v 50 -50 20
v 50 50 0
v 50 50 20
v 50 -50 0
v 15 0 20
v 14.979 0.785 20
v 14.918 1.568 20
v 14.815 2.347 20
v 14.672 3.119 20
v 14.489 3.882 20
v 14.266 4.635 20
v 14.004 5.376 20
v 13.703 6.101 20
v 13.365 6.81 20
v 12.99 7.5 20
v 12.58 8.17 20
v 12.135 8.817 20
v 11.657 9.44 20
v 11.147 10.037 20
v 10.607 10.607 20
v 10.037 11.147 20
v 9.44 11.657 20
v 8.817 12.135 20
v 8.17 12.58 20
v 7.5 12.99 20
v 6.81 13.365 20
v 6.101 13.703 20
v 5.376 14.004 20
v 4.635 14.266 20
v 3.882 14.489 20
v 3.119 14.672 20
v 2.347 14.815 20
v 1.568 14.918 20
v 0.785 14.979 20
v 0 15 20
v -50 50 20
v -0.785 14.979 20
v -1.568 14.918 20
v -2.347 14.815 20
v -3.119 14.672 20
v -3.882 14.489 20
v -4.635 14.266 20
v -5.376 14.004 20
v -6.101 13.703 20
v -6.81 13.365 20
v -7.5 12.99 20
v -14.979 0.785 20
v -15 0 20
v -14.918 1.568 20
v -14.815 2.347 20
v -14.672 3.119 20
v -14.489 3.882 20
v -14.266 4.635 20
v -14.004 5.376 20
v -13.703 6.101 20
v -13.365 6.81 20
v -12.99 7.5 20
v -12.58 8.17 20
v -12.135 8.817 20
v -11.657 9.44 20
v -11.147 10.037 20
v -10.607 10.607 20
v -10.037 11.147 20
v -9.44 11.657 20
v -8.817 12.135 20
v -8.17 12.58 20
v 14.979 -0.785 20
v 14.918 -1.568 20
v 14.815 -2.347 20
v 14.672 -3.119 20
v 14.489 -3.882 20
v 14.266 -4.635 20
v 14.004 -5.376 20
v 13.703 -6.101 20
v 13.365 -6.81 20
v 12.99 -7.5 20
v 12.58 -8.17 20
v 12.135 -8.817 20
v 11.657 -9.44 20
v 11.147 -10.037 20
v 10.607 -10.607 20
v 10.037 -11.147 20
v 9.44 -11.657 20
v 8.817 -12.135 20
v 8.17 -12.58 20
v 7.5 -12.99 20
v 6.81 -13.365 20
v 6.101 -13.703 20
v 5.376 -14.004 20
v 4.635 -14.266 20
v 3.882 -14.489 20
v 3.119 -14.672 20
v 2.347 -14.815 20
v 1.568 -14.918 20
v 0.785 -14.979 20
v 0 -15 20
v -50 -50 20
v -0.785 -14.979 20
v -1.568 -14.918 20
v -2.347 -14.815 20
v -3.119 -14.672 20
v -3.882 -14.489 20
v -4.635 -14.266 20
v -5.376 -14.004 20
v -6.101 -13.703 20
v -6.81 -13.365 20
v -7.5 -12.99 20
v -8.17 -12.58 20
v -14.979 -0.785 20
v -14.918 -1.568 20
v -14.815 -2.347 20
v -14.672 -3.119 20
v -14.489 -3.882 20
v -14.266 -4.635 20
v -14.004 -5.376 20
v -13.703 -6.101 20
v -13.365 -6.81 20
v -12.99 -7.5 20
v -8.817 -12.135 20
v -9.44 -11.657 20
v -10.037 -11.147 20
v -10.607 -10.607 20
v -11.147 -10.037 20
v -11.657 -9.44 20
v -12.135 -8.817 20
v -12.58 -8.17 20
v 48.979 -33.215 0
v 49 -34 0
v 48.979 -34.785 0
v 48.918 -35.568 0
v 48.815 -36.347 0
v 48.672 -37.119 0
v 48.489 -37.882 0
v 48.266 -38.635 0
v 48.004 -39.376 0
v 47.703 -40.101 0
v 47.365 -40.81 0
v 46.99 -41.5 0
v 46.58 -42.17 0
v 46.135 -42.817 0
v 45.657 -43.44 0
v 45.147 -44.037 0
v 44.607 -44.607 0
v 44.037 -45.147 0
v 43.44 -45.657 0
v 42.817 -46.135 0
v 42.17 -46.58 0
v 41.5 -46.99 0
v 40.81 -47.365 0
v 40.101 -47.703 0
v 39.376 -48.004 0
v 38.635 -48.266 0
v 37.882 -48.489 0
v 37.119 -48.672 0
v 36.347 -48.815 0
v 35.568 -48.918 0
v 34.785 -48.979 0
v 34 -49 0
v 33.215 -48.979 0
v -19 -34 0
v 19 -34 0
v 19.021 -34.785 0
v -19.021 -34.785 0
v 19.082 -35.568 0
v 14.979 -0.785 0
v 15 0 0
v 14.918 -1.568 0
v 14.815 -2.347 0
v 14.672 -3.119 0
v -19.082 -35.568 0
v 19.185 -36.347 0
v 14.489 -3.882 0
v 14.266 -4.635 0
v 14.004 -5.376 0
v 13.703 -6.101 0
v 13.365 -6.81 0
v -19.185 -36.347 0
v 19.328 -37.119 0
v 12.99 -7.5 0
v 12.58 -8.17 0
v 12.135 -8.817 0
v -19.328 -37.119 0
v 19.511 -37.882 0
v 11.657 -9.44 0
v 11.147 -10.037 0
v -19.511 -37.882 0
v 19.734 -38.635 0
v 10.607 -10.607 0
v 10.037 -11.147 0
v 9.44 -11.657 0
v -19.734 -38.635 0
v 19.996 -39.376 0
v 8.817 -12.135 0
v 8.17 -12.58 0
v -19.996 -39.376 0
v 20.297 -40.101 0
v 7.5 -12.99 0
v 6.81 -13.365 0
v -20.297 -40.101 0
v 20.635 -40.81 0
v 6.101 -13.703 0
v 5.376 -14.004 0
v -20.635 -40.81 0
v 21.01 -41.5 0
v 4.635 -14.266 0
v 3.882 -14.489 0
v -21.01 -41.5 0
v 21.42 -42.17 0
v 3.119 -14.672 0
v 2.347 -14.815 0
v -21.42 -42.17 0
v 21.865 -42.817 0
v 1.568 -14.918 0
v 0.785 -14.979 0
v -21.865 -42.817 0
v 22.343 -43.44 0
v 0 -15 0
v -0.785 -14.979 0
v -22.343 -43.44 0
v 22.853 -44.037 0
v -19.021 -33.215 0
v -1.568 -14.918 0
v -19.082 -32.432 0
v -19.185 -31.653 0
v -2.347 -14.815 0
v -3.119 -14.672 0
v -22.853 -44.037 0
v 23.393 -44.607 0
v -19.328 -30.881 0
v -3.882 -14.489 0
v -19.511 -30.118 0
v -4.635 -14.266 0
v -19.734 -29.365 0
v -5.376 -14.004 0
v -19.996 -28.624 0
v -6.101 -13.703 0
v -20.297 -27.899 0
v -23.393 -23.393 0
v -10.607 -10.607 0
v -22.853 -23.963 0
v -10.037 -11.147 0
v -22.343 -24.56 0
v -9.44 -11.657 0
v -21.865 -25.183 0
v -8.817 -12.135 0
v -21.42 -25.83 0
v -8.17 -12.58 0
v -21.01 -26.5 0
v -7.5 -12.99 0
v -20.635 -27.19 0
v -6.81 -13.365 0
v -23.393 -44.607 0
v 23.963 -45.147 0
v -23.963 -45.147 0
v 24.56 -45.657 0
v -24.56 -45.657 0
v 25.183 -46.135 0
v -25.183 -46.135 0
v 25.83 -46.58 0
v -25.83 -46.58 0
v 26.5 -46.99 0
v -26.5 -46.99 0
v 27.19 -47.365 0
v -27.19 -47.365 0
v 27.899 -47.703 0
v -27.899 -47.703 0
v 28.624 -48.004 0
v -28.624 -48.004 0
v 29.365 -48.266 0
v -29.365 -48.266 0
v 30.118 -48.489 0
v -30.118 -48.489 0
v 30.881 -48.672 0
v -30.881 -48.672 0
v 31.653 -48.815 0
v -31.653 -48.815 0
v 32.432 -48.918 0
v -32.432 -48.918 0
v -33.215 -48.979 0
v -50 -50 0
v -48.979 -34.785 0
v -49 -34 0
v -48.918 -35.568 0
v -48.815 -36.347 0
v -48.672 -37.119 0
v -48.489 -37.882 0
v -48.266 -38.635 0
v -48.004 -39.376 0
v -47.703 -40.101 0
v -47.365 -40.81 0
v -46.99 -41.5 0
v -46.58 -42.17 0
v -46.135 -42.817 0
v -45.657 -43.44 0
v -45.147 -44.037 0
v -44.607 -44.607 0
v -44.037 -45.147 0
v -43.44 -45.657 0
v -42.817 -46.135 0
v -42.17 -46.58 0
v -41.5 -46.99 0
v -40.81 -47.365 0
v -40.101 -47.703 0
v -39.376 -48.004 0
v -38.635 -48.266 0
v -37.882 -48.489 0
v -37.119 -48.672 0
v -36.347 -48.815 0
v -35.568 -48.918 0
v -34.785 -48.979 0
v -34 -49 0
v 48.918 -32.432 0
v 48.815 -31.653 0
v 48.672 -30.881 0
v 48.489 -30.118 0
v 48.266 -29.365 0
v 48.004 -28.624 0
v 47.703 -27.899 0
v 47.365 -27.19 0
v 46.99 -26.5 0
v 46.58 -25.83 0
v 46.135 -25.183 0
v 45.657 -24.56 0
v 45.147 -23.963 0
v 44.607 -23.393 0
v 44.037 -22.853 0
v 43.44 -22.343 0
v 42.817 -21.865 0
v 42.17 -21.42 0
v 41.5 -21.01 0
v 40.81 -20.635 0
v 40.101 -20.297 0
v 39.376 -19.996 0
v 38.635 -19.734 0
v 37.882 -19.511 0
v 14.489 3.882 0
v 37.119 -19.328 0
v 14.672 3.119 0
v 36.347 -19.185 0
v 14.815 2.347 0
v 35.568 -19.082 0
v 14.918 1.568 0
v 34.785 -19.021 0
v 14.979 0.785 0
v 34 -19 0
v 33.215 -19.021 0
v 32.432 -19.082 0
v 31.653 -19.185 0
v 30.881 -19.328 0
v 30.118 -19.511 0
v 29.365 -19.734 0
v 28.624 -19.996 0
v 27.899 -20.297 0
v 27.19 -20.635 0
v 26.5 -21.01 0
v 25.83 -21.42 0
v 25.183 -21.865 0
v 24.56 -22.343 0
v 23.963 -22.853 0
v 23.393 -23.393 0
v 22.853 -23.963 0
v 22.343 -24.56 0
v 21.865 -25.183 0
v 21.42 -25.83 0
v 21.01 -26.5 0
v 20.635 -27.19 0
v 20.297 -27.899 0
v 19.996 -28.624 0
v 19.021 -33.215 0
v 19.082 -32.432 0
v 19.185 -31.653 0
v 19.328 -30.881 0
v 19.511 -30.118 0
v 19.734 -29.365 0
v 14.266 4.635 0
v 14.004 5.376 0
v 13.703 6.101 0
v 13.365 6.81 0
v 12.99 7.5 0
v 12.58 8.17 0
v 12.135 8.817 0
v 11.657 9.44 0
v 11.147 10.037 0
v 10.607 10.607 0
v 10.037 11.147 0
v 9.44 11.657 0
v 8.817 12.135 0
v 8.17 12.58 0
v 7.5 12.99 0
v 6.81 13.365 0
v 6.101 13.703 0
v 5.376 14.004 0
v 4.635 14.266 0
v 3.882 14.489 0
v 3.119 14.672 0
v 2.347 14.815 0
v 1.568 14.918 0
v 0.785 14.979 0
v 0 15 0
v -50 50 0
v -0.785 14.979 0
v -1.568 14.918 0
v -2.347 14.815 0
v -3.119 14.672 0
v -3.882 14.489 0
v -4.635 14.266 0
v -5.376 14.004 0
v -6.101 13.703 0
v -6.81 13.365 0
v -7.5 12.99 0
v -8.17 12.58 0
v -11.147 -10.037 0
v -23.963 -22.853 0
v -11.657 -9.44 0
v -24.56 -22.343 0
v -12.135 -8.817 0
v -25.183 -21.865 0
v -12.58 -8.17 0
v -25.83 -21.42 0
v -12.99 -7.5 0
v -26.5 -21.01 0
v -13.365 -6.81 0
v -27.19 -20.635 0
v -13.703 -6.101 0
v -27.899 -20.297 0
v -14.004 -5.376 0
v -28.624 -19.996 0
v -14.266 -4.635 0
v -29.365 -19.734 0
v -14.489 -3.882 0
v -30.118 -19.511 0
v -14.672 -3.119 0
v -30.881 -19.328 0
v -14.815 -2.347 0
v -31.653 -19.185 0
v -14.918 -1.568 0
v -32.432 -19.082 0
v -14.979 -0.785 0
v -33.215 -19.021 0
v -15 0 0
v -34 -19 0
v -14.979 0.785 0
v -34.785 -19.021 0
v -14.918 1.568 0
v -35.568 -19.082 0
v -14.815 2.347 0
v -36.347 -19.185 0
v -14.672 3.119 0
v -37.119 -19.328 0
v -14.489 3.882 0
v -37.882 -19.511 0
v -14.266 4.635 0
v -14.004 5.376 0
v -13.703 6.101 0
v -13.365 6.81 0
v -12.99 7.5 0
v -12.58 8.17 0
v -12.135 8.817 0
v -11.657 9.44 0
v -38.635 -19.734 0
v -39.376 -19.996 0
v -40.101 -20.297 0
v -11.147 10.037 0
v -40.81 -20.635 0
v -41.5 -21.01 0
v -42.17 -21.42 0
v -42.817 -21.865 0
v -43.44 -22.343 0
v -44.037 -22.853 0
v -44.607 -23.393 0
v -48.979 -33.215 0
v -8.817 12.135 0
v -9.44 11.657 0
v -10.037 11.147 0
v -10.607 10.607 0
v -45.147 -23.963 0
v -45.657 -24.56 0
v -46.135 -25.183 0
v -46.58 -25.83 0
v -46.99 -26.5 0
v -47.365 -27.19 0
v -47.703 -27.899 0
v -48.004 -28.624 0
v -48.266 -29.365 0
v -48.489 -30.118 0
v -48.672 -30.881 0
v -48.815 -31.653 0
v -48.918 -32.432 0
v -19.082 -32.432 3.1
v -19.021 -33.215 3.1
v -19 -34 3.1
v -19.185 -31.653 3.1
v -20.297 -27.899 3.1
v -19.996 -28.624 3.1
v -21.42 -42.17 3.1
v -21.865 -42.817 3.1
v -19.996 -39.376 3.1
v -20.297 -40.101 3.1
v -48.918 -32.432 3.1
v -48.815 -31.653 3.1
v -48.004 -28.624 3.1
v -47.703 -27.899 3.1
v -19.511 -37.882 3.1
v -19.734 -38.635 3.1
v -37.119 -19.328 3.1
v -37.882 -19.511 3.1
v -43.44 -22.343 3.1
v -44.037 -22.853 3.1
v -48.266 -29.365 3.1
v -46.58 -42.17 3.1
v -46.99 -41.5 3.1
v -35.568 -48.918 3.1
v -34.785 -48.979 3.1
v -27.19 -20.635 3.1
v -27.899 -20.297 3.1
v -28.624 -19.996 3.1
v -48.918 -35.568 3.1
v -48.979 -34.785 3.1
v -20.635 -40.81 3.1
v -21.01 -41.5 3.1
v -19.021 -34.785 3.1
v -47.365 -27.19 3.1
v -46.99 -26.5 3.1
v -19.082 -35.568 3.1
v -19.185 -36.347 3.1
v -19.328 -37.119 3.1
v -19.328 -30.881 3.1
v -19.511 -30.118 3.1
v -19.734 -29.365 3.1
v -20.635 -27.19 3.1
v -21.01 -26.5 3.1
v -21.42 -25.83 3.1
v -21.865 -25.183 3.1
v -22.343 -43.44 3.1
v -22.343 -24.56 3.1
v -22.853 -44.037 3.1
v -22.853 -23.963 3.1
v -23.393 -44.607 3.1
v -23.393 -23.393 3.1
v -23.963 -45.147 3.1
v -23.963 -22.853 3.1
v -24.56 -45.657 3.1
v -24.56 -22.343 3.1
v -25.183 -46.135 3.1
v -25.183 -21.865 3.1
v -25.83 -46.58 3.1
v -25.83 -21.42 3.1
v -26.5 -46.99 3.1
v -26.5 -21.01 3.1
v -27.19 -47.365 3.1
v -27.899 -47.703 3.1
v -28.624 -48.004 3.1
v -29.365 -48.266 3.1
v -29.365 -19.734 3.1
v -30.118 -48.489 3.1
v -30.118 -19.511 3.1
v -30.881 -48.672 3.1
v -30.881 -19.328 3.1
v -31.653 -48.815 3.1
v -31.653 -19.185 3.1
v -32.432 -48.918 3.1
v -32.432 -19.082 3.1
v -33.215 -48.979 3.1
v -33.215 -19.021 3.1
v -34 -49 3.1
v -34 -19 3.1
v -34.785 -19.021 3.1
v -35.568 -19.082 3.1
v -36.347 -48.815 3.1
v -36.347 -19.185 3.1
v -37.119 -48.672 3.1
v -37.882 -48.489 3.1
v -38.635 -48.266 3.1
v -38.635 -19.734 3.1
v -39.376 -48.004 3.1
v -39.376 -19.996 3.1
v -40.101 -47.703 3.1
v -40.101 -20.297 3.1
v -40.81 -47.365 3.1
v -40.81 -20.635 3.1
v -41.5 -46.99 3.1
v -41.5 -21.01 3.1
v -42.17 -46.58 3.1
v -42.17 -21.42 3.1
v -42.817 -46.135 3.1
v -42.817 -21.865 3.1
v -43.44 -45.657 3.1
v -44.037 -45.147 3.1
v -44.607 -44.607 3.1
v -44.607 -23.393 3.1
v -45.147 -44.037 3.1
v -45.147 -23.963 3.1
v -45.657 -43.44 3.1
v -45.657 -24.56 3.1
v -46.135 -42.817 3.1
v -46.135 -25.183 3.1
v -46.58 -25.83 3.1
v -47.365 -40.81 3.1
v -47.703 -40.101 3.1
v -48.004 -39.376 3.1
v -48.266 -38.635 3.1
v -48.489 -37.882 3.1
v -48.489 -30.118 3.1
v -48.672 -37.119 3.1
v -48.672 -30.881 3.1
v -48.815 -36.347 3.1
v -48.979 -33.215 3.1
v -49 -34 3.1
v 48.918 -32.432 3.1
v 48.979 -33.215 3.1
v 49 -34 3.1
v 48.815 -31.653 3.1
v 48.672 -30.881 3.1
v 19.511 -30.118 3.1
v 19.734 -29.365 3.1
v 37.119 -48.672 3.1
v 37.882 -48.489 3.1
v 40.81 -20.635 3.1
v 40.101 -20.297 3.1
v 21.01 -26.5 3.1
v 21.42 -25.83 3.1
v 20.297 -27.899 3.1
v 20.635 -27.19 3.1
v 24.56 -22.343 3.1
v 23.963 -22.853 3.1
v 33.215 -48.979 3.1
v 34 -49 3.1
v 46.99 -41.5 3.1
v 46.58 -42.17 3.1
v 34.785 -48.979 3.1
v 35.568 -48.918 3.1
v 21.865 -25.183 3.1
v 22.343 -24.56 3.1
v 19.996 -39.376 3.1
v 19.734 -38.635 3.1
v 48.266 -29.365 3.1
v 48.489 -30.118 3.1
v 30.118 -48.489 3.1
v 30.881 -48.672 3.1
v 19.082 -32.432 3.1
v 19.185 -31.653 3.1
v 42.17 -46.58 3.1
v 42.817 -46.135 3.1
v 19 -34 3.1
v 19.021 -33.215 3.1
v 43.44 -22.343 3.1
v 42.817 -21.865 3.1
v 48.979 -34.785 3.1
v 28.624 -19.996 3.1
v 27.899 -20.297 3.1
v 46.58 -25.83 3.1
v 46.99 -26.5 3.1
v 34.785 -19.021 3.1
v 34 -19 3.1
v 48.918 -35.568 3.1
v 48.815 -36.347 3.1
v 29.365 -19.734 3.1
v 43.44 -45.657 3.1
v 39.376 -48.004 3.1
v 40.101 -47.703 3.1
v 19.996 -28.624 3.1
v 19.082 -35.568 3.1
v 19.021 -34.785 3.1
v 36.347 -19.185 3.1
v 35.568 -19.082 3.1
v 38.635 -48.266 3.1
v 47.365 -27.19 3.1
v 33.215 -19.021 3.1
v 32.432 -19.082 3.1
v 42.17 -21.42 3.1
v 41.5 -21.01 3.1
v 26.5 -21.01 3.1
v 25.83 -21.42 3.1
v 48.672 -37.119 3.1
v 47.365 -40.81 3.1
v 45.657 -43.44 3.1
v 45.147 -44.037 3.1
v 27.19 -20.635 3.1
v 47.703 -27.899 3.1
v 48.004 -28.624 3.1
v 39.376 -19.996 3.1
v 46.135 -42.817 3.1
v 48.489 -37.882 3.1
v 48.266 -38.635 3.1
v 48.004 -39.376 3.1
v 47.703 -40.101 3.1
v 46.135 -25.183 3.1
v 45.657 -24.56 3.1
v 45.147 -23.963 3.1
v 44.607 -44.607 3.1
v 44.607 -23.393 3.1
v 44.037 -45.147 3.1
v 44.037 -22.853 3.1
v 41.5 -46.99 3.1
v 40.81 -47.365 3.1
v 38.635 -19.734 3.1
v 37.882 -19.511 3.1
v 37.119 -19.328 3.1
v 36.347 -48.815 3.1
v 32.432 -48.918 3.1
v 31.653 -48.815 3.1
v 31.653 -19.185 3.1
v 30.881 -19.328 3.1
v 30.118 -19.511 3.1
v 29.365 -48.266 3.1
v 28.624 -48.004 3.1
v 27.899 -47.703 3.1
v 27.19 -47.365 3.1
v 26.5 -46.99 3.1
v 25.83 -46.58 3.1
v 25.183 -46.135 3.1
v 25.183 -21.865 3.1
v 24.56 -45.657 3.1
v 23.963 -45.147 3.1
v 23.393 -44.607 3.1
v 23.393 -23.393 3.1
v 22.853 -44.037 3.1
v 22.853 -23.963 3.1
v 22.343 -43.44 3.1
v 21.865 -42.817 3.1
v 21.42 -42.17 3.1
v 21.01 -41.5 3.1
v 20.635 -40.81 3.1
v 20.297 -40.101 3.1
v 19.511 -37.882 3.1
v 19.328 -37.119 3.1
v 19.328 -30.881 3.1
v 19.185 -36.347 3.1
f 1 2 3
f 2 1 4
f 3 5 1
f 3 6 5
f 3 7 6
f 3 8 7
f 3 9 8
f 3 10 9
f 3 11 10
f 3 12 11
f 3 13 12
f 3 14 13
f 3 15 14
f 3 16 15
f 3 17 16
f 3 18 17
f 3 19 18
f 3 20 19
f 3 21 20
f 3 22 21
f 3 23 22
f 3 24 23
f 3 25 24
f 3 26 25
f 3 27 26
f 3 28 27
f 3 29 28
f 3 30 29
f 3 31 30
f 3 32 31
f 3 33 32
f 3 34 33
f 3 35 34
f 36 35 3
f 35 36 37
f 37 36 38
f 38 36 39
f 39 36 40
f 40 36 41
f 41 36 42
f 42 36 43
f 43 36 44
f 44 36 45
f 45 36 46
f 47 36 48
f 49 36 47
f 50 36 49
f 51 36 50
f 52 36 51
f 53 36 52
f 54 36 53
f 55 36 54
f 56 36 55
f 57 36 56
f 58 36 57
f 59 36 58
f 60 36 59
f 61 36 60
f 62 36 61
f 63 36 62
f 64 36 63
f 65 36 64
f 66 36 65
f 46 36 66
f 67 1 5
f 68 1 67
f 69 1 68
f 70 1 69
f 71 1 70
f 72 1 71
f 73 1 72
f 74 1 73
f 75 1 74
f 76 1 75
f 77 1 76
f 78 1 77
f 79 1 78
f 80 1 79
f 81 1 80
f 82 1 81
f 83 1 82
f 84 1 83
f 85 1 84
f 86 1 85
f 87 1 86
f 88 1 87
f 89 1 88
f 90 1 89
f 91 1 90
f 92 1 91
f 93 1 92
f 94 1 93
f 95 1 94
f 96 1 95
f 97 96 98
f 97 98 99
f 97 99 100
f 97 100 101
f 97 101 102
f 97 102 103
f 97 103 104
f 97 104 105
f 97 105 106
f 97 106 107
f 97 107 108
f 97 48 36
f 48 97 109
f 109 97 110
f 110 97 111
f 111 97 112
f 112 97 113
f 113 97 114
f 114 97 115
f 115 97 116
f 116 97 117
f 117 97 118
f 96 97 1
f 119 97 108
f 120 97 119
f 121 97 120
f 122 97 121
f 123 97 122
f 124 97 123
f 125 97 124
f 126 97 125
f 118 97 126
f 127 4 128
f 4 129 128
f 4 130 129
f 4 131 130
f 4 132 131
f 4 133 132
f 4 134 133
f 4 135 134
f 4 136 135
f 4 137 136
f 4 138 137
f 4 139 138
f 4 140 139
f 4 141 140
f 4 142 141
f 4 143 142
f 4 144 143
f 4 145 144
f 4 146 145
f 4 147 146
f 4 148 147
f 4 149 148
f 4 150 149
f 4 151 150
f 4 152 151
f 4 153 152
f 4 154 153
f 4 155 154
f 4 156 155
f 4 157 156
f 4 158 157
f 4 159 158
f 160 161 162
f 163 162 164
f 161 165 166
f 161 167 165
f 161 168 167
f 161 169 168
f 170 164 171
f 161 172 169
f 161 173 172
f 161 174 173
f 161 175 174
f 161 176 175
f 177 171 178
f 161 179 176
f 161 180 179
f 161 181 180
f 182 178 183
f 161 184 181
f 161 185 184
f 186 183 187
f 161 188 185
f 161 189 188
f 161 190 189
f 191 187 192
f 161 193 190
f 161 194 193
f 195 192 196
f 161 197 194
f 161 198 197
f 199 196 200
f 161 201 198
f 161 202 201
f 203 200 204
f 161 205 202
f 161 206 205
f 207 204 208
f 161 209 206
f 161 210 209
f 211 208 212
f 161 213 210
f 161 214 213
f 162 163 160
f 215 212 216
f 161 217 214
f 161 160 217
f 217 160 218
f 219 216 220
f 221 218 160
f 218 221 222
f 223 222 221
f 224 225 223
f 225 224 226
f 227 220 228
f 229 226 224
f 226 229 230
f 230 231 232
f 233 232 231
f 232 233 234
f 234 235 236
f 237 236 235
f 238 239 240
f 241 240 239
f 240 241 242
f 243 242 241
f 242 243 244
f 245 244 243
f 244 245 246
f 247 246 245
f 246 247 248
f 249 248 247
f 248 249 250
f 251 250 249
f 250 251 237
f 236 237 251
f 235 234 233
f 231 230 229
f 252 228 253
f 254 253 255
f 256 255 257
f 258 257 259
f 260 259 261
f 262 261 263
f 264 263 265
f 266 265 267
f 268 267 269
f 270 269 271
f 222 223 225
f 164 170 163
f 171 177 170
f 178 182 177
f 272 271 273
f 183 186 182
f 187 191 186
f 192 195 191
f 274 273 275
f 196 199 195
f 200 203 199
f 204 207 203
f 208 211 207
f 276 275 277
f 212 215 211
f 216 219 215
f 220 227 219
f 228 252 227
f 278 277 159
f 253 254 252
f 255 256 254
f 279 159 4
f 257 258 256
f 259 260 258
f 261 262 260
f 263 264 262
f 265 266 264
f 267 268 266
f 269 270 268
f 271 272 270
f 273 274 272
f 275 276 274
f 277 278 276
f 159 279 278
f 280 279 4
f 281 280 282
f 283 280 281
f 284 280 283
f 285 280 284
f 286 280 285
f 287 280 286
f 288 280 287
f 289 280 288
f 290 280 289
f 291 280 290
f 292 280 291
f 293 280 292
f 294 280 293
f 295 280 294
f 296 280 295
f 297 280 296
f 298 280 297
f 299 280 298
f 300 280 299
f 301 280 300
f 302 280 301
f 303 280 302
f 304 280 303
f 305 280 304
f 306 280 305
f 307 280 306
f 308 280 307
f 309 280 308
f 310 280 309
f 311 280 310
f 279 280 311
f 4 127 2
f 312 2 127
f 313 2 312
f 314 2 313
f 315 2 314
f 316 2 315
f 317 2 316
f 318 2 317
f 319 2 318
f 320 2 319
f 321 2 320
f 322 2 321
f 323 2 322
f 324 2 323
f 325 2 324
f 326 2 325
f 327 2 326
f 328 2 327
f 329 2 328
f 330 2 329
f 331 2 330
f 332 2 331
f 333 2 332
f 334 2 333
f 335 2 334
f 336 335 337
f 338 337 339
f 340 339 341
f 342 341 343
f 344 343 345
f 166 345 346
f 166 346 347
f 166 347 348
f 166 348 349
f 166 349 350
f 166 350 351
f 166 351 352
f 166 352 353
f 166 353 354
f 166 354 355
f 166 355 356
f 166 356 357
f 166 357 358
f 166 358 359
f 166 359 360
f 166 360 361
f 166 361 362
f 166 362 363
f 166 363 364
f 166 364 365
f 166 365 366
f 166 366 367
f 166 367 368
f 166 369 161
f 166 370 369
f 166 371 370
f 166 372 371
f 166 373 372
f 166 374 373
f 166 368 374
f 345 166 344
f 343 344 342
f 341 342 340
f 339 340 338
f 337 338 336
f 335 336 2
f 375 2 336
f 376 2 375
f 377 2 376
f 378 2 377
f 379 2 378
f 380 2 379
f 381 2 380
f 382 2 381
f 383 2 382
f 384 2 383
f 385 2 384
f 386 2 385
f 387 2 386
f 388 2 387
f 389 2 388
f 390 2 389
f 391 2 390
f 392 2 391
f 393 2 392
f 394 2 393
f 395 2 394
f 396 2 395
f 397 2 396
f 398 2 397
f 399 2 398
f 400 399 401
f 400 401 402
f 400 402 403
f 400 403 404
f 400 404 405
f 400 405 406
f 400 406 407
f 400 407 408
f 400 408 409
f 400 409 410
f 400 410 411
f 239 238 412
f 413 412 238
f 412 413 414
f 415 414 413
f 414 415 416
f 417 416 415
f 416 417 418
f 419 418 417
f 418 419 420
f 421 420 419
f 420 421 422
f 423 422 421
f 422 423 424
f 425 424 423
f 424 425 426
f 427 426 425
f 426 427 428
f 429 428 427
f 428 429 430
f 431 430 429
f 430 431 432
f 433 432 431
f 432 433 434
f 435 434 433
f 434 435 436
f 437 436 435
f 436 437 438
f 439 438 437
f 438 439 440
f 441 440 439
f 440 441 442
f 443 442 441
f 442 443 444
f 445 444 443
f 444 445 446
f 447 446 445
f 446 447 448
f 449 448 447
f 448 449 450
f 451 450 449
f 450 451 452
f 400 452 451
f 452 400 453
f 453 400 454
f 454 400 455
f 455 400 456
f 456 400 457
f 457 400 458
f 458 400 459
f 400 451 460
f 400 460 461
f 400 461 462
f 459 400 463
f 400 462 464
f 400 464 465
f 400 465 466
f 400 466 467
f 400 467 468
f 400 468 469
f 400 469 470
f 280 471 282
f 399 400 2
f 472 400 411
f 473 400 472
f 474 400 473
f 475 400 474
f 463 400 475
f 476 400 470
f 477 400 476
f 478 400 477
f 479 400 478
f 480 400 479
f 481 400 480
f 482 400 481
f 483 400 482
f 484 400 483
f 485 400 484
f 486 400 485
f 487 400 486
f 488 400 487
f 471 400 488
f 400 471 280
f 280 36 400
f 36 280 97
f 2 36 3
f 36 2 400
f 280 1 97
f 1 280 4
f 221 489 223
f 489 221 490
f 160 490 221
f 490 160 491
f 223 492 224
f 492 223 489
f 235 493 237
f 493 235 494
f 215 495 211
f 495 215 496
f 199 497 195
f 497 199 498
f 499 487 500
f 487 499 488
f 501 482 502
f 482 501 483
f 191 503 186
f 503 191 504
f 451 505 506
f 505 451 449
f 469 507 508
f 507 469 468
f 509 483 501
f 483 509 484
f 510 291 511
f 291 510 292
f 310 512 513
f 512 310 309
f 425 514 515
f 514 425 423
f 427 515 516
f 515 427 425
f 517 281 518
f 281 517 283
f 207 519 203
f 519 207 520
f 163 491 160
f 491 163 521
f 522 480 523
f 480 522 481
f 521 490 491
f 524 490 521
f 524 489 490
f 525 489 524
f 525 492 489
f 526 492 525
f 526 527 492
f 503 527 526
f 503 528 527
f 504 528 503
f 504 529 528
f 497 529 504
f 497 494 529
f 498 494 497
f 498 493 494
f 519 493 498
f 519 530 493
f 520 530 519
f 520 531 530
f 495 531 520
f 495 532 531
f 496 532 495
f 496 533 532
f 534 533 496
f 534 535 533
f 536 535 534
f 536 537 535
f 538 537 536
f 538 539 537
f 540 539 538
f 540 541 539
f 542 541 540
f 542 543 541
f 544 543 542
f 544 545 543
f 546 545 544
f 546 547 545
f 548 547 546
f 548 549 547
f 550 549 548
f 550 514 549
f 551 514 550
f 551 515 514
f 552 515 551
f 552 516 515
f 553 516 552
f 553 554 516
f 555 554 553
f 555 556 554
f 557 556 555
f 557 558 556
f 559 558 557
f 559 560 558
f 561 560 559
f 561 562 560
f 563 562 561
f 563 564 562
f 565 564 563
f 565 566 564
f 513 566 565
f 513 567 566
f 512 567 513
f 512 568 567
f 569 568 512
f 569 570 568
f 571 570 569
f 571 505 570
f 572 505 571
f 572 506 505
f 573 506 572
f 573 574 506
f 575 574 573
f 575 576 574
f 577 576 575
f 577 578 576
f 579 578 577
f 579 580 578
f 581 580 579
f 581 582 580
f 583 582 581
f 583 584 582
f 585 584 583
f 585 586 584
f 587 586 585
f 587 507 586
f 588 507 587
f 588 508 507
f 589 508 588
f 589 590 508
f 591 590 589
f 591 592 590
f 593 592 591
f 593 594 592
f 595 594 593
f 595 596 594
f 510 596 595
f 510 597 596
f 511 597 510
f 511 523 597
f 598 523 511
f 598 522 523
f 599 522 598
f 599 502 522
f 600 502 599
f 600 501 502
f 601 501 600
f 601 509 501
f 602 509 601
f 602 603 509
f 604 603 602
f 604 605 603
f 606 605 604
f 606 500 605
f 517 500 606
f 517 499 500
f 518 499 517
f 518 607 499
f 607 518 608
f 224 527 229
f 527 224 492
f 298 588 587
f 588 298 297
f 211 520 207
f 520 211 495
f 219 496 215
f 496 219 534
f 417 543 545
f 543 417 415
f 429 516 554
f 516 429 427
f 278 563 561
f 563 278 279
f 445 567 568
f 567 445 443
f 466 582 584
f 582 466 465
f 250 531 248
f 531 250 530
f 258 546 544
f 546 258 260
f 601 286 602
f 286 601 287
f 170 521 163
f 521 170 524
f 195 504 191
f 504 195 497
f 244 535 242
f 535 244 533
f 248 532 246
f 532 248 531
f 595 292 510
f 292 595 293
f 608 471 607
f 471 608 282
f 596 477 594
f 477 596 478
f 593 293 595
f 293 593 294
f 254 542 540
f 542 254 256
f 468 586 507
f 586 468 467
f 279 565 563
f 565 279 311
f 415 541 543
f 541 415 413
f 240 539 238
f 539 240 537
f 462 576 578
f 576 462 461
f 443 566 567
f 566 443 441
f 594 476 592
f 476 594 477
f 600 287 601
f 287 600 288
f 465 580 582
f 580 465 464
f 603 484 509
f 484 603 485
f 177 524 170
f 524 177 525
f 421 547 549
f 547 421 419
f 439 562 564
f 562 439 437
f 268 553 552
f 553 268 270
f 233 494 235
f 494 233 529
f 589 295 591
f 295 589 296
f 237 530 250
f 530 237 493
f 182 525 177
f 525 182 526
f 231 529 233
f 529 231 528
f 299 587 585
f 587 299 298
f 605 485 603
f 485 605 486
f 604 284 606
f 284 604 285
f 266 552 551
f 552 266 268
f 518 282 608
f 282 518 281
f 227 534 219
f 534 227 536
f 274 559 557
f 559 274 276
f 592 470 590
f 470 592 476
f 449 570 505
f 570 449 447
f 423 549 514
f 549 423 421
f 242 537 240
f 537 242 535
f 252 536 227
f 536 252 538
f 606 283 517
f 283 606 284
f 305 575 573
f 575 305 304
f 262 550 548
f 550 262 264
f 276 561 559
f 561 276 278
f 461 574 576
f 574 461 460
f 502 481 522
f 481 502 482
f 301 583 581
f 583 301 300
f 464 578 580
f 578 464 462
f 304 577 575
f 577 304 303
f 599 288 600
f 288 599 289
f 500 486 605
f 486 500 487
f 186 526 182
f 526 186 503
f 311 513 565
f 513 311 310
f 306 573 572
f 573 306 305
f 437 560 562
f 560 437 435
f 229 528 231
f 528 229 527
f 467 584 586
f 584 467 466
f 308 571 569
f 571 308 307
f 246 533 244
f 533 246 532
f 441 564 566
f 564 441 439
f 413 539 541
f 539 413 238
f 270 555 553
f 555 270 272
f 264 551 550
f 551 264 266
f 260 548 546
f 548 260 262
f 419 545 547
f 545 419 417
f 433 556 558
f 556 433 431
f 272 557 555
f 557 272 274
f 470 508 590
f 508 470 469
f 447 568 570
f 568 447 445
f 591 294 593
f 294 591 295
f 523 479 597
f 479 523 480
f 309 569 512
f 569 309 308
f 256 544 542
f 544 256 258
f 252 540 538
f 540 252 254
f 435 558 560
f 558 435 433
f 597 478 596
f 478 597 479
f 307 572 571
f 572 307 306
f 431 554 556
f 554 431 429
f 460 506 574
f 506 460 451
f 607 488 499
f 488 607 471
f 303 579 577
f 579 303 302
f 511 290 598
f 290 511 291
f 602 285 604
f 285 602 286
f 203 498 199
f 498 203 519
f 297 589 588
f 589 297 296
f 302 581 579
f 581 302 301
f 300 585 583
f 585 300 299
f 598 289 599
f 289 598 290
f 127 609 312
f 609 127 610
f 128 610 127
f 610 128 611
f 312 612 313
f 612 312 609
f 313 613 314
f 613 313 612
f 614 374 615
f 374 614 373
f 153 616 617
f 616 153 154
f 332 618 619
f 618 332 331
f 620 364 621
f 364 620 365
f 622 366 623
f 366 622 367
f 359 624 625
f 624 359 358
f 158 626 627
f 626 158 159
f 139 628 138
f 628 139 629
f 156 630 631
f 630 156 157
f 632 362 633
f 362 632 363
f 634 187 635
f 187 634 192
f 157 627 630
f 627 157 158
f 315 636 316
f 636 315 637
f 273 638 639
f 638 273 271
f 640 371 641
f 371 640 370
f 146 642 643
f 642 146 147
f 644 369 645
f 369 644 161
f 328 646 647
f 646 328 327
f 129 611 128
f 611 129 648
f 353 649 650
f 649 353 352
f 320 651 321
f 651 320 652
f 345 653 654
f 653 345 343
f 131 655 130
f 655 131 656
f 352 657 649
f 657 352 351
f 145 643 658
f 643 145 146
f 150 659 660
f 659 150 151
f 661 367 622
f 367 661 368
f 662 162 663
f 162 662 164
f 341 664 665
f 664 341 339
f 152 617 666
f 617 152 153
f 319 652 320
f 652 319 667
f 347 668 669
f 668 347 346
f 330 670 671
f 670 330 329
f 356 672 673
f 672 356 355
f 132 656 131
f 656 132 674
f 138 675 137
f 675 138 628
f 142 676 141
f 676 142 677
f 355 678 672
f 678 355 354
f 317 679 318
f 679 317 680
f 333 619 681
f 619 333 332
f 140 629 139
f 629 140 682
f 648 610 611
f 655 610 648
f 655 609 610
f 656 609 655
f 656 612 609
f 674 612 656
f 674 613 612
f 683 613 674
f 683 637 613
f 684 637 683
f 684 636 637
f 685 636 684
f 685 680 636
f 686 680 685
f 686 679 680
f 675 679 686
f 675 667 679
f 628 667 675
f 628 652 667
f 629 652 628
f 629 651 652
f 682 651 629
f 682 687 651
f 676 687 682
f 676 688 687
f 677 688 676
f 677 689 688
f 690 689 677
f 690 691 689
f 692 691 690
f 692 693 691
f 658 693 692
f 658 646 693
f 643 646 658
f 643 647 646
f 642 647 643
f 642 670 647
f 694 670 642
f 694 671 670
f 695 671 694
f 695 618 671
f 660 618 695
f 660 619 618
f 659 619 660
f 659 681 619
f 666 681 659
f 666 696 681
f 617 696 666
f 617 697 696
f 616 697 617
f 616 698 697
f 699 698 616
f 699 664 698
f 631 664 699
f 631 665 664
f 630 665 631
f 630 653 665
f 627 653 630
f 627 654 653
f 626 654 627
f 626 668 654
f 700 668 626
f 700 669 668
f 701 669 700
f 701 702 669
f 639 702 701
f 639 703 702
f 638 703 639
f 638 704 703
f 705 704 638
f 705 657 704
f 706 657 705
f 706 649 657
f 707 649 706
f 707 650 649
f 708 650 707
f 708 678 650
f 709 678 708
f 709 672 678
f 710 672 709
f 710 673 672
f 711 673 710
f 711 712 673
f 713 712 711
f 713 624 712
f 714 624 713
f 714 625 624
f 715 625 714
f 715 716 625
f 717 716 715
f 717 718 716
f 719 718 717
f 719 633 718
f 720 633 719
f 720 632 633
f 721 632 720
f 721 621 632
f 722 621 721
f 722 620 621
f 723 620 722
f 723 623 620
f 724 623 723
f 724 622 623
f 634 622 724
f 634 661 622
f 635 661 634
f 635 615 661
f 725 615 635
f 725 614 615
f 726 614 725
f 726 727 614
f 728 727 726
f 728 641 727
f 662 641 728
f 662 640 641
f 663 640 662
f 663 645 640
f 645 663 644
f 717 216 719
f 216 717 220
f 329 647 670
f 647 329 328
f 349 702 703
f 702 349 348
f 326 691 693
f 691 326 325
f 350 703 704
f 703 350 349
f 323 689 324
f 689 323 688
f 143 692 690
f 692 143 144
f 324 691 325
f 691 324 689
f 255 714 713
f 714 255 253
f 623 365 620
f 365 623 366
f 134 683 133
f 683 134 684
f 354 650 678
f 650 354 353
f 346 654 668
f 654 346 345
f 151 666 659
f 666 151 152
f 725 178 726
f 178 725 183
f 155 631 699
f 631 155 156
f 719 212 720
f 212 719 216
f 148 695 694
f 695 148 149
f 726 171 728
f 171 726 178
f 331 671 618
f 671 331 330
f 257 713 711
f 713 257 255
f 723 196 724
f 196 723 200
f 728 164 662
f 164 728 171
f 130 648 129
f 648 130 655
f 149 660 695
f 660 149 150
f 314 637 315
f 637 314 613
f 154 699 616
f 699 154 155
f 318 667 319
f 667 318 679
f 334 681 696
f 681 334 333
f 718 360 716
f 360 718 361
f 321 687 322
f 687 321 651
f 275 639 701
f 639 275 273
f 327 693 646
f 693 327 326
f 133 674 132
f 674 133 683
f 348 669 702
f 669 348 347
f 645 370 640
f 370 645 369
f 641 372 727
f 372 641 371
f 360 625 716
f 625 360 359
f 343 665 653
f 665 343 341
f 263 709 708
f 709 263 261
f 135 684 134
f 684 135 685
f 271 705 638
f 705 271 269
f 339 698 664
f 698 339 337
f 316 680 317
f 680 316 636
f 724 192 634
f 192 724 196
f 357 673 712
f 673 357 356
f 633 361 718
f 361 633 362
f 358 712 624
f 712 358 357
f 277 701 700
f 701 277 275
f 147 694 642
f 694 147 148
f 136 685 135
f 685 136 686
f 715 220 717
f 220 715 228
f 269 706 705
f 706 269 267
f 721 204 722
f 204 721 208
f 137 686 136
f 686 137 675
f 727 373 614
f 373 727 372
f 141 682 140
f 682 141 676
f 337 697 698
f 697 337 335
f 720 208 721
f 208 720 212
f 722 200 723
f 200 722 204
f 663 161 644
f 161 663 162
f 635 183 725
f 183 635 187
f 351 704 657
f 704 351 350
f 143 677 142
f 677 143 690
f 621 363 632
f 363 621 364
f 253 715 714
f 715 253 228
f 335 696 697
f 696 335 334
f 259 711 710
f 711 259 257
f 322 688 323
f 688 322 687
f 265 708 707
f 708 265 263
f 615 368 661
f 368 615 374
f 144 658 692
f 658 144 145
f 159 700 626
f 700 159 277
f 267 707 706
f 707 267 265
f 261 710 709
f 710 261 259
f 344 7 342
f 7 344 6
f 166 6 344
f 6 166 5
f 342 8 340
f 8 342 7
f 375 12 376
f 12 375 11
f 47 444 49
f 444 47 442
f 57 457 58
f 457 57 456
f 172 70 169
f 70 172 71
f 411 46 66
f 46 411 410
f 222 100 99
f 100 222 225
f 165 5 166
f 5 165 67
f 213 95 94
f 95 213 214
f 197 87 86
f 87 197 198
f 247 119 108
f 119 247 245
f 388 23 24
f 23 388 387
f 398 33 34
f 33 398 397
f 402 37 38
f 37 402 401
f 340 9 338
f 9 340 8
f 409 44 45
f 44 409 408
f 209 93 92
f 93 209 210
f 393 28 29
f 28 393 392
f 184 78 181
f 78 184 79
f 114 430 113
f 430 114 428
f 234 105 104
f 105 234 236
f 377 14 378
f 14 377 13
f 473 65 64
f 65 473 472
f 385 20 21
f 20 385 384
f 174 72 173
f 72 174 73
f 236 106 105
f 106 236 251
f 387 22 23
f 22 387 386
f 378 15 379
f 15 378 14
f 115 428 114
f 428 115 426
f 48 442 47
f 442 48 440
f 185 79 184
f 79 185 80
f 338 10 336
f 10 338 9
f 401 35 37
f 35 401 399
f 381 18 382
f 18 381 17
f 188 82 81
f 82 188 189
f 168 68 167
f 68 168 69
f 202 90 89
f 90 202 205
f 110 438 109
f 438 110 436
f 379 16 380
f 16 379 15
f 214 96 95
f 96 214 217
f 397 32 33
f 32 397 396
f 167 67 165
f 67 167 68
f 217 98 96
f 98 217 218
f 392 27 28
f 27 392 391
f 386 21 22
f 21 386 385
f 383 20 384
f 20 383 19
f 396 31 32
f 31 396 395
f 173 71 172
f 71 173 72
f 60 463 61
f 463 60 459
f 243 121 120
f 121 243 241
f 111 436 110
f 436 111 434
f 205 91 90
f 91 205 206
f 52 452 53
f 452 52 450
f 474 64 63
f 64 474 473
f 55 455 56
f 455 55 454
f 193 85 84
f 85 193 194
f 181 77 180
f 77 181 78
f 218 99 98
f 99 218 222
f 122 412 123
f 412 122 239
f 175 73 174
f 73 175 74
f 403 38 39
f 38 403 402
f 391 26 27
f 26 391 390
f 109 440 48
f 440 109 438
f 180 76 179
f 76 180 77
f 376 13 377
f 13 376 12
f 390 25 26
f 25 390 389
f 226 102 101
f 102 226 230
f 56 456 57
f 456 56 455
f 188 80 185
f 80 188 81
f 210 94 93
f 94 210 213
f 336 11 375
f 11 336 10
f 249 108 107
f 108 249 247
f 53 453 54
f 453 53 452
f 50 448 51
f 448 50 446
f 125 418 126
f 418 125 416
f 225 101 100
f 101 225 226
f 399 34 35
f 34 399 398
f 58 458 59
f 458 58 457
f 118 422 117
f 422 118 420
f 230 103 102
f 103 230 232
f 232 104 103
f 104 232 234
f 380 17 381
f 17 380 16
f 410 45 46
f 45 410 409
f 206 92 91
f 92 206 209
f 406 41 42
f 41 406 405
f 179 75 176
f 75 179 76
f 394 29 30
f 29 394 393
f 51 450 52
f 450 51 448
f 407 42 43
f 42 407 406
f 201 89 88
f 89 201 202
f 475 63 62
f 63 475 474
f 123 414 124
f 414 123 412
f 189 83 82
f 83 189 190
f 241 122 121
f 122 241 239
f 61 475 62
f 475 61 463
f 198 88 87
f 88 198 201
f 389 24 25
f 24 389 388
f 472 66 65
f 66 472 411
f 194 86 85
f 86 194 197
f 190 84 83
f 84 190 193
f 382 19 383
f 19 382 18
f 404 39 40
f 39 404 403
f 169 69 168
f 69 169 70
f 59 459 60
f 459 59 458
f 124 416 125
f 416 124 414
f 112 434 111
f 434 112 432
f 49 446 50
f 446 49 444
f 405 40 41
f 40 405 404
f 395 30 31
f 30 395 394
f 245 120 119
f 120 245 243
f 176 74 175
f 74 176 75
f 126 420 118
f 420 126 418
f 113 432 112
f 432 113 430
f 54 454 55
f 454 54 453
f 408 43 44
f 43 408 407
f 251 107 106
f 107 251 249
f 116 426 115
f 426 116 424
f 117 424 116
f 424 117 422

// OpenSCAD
module CoinBattery(){
  cylinder(d=30,h=3.2,$fn=120);}
module CoinBattery_cut_to_20_0(){
  cylinder(d=30,h=20.008,$fn=120);}
module CutExample(){
  difference(){
    translate([-50, -50, 0])color("LightCoral")cube([100, 100, 20]);
    translate([-34, -34, -0.1])color("silver")CoinBattery();
    translate([34, -34, -0.1])color("silver")CoinBattery();
    translate([0, 0, -0.004])color("silver")CoinBattery_cut_to_20_0();
  }
}
$fn=64;
CutExample();
